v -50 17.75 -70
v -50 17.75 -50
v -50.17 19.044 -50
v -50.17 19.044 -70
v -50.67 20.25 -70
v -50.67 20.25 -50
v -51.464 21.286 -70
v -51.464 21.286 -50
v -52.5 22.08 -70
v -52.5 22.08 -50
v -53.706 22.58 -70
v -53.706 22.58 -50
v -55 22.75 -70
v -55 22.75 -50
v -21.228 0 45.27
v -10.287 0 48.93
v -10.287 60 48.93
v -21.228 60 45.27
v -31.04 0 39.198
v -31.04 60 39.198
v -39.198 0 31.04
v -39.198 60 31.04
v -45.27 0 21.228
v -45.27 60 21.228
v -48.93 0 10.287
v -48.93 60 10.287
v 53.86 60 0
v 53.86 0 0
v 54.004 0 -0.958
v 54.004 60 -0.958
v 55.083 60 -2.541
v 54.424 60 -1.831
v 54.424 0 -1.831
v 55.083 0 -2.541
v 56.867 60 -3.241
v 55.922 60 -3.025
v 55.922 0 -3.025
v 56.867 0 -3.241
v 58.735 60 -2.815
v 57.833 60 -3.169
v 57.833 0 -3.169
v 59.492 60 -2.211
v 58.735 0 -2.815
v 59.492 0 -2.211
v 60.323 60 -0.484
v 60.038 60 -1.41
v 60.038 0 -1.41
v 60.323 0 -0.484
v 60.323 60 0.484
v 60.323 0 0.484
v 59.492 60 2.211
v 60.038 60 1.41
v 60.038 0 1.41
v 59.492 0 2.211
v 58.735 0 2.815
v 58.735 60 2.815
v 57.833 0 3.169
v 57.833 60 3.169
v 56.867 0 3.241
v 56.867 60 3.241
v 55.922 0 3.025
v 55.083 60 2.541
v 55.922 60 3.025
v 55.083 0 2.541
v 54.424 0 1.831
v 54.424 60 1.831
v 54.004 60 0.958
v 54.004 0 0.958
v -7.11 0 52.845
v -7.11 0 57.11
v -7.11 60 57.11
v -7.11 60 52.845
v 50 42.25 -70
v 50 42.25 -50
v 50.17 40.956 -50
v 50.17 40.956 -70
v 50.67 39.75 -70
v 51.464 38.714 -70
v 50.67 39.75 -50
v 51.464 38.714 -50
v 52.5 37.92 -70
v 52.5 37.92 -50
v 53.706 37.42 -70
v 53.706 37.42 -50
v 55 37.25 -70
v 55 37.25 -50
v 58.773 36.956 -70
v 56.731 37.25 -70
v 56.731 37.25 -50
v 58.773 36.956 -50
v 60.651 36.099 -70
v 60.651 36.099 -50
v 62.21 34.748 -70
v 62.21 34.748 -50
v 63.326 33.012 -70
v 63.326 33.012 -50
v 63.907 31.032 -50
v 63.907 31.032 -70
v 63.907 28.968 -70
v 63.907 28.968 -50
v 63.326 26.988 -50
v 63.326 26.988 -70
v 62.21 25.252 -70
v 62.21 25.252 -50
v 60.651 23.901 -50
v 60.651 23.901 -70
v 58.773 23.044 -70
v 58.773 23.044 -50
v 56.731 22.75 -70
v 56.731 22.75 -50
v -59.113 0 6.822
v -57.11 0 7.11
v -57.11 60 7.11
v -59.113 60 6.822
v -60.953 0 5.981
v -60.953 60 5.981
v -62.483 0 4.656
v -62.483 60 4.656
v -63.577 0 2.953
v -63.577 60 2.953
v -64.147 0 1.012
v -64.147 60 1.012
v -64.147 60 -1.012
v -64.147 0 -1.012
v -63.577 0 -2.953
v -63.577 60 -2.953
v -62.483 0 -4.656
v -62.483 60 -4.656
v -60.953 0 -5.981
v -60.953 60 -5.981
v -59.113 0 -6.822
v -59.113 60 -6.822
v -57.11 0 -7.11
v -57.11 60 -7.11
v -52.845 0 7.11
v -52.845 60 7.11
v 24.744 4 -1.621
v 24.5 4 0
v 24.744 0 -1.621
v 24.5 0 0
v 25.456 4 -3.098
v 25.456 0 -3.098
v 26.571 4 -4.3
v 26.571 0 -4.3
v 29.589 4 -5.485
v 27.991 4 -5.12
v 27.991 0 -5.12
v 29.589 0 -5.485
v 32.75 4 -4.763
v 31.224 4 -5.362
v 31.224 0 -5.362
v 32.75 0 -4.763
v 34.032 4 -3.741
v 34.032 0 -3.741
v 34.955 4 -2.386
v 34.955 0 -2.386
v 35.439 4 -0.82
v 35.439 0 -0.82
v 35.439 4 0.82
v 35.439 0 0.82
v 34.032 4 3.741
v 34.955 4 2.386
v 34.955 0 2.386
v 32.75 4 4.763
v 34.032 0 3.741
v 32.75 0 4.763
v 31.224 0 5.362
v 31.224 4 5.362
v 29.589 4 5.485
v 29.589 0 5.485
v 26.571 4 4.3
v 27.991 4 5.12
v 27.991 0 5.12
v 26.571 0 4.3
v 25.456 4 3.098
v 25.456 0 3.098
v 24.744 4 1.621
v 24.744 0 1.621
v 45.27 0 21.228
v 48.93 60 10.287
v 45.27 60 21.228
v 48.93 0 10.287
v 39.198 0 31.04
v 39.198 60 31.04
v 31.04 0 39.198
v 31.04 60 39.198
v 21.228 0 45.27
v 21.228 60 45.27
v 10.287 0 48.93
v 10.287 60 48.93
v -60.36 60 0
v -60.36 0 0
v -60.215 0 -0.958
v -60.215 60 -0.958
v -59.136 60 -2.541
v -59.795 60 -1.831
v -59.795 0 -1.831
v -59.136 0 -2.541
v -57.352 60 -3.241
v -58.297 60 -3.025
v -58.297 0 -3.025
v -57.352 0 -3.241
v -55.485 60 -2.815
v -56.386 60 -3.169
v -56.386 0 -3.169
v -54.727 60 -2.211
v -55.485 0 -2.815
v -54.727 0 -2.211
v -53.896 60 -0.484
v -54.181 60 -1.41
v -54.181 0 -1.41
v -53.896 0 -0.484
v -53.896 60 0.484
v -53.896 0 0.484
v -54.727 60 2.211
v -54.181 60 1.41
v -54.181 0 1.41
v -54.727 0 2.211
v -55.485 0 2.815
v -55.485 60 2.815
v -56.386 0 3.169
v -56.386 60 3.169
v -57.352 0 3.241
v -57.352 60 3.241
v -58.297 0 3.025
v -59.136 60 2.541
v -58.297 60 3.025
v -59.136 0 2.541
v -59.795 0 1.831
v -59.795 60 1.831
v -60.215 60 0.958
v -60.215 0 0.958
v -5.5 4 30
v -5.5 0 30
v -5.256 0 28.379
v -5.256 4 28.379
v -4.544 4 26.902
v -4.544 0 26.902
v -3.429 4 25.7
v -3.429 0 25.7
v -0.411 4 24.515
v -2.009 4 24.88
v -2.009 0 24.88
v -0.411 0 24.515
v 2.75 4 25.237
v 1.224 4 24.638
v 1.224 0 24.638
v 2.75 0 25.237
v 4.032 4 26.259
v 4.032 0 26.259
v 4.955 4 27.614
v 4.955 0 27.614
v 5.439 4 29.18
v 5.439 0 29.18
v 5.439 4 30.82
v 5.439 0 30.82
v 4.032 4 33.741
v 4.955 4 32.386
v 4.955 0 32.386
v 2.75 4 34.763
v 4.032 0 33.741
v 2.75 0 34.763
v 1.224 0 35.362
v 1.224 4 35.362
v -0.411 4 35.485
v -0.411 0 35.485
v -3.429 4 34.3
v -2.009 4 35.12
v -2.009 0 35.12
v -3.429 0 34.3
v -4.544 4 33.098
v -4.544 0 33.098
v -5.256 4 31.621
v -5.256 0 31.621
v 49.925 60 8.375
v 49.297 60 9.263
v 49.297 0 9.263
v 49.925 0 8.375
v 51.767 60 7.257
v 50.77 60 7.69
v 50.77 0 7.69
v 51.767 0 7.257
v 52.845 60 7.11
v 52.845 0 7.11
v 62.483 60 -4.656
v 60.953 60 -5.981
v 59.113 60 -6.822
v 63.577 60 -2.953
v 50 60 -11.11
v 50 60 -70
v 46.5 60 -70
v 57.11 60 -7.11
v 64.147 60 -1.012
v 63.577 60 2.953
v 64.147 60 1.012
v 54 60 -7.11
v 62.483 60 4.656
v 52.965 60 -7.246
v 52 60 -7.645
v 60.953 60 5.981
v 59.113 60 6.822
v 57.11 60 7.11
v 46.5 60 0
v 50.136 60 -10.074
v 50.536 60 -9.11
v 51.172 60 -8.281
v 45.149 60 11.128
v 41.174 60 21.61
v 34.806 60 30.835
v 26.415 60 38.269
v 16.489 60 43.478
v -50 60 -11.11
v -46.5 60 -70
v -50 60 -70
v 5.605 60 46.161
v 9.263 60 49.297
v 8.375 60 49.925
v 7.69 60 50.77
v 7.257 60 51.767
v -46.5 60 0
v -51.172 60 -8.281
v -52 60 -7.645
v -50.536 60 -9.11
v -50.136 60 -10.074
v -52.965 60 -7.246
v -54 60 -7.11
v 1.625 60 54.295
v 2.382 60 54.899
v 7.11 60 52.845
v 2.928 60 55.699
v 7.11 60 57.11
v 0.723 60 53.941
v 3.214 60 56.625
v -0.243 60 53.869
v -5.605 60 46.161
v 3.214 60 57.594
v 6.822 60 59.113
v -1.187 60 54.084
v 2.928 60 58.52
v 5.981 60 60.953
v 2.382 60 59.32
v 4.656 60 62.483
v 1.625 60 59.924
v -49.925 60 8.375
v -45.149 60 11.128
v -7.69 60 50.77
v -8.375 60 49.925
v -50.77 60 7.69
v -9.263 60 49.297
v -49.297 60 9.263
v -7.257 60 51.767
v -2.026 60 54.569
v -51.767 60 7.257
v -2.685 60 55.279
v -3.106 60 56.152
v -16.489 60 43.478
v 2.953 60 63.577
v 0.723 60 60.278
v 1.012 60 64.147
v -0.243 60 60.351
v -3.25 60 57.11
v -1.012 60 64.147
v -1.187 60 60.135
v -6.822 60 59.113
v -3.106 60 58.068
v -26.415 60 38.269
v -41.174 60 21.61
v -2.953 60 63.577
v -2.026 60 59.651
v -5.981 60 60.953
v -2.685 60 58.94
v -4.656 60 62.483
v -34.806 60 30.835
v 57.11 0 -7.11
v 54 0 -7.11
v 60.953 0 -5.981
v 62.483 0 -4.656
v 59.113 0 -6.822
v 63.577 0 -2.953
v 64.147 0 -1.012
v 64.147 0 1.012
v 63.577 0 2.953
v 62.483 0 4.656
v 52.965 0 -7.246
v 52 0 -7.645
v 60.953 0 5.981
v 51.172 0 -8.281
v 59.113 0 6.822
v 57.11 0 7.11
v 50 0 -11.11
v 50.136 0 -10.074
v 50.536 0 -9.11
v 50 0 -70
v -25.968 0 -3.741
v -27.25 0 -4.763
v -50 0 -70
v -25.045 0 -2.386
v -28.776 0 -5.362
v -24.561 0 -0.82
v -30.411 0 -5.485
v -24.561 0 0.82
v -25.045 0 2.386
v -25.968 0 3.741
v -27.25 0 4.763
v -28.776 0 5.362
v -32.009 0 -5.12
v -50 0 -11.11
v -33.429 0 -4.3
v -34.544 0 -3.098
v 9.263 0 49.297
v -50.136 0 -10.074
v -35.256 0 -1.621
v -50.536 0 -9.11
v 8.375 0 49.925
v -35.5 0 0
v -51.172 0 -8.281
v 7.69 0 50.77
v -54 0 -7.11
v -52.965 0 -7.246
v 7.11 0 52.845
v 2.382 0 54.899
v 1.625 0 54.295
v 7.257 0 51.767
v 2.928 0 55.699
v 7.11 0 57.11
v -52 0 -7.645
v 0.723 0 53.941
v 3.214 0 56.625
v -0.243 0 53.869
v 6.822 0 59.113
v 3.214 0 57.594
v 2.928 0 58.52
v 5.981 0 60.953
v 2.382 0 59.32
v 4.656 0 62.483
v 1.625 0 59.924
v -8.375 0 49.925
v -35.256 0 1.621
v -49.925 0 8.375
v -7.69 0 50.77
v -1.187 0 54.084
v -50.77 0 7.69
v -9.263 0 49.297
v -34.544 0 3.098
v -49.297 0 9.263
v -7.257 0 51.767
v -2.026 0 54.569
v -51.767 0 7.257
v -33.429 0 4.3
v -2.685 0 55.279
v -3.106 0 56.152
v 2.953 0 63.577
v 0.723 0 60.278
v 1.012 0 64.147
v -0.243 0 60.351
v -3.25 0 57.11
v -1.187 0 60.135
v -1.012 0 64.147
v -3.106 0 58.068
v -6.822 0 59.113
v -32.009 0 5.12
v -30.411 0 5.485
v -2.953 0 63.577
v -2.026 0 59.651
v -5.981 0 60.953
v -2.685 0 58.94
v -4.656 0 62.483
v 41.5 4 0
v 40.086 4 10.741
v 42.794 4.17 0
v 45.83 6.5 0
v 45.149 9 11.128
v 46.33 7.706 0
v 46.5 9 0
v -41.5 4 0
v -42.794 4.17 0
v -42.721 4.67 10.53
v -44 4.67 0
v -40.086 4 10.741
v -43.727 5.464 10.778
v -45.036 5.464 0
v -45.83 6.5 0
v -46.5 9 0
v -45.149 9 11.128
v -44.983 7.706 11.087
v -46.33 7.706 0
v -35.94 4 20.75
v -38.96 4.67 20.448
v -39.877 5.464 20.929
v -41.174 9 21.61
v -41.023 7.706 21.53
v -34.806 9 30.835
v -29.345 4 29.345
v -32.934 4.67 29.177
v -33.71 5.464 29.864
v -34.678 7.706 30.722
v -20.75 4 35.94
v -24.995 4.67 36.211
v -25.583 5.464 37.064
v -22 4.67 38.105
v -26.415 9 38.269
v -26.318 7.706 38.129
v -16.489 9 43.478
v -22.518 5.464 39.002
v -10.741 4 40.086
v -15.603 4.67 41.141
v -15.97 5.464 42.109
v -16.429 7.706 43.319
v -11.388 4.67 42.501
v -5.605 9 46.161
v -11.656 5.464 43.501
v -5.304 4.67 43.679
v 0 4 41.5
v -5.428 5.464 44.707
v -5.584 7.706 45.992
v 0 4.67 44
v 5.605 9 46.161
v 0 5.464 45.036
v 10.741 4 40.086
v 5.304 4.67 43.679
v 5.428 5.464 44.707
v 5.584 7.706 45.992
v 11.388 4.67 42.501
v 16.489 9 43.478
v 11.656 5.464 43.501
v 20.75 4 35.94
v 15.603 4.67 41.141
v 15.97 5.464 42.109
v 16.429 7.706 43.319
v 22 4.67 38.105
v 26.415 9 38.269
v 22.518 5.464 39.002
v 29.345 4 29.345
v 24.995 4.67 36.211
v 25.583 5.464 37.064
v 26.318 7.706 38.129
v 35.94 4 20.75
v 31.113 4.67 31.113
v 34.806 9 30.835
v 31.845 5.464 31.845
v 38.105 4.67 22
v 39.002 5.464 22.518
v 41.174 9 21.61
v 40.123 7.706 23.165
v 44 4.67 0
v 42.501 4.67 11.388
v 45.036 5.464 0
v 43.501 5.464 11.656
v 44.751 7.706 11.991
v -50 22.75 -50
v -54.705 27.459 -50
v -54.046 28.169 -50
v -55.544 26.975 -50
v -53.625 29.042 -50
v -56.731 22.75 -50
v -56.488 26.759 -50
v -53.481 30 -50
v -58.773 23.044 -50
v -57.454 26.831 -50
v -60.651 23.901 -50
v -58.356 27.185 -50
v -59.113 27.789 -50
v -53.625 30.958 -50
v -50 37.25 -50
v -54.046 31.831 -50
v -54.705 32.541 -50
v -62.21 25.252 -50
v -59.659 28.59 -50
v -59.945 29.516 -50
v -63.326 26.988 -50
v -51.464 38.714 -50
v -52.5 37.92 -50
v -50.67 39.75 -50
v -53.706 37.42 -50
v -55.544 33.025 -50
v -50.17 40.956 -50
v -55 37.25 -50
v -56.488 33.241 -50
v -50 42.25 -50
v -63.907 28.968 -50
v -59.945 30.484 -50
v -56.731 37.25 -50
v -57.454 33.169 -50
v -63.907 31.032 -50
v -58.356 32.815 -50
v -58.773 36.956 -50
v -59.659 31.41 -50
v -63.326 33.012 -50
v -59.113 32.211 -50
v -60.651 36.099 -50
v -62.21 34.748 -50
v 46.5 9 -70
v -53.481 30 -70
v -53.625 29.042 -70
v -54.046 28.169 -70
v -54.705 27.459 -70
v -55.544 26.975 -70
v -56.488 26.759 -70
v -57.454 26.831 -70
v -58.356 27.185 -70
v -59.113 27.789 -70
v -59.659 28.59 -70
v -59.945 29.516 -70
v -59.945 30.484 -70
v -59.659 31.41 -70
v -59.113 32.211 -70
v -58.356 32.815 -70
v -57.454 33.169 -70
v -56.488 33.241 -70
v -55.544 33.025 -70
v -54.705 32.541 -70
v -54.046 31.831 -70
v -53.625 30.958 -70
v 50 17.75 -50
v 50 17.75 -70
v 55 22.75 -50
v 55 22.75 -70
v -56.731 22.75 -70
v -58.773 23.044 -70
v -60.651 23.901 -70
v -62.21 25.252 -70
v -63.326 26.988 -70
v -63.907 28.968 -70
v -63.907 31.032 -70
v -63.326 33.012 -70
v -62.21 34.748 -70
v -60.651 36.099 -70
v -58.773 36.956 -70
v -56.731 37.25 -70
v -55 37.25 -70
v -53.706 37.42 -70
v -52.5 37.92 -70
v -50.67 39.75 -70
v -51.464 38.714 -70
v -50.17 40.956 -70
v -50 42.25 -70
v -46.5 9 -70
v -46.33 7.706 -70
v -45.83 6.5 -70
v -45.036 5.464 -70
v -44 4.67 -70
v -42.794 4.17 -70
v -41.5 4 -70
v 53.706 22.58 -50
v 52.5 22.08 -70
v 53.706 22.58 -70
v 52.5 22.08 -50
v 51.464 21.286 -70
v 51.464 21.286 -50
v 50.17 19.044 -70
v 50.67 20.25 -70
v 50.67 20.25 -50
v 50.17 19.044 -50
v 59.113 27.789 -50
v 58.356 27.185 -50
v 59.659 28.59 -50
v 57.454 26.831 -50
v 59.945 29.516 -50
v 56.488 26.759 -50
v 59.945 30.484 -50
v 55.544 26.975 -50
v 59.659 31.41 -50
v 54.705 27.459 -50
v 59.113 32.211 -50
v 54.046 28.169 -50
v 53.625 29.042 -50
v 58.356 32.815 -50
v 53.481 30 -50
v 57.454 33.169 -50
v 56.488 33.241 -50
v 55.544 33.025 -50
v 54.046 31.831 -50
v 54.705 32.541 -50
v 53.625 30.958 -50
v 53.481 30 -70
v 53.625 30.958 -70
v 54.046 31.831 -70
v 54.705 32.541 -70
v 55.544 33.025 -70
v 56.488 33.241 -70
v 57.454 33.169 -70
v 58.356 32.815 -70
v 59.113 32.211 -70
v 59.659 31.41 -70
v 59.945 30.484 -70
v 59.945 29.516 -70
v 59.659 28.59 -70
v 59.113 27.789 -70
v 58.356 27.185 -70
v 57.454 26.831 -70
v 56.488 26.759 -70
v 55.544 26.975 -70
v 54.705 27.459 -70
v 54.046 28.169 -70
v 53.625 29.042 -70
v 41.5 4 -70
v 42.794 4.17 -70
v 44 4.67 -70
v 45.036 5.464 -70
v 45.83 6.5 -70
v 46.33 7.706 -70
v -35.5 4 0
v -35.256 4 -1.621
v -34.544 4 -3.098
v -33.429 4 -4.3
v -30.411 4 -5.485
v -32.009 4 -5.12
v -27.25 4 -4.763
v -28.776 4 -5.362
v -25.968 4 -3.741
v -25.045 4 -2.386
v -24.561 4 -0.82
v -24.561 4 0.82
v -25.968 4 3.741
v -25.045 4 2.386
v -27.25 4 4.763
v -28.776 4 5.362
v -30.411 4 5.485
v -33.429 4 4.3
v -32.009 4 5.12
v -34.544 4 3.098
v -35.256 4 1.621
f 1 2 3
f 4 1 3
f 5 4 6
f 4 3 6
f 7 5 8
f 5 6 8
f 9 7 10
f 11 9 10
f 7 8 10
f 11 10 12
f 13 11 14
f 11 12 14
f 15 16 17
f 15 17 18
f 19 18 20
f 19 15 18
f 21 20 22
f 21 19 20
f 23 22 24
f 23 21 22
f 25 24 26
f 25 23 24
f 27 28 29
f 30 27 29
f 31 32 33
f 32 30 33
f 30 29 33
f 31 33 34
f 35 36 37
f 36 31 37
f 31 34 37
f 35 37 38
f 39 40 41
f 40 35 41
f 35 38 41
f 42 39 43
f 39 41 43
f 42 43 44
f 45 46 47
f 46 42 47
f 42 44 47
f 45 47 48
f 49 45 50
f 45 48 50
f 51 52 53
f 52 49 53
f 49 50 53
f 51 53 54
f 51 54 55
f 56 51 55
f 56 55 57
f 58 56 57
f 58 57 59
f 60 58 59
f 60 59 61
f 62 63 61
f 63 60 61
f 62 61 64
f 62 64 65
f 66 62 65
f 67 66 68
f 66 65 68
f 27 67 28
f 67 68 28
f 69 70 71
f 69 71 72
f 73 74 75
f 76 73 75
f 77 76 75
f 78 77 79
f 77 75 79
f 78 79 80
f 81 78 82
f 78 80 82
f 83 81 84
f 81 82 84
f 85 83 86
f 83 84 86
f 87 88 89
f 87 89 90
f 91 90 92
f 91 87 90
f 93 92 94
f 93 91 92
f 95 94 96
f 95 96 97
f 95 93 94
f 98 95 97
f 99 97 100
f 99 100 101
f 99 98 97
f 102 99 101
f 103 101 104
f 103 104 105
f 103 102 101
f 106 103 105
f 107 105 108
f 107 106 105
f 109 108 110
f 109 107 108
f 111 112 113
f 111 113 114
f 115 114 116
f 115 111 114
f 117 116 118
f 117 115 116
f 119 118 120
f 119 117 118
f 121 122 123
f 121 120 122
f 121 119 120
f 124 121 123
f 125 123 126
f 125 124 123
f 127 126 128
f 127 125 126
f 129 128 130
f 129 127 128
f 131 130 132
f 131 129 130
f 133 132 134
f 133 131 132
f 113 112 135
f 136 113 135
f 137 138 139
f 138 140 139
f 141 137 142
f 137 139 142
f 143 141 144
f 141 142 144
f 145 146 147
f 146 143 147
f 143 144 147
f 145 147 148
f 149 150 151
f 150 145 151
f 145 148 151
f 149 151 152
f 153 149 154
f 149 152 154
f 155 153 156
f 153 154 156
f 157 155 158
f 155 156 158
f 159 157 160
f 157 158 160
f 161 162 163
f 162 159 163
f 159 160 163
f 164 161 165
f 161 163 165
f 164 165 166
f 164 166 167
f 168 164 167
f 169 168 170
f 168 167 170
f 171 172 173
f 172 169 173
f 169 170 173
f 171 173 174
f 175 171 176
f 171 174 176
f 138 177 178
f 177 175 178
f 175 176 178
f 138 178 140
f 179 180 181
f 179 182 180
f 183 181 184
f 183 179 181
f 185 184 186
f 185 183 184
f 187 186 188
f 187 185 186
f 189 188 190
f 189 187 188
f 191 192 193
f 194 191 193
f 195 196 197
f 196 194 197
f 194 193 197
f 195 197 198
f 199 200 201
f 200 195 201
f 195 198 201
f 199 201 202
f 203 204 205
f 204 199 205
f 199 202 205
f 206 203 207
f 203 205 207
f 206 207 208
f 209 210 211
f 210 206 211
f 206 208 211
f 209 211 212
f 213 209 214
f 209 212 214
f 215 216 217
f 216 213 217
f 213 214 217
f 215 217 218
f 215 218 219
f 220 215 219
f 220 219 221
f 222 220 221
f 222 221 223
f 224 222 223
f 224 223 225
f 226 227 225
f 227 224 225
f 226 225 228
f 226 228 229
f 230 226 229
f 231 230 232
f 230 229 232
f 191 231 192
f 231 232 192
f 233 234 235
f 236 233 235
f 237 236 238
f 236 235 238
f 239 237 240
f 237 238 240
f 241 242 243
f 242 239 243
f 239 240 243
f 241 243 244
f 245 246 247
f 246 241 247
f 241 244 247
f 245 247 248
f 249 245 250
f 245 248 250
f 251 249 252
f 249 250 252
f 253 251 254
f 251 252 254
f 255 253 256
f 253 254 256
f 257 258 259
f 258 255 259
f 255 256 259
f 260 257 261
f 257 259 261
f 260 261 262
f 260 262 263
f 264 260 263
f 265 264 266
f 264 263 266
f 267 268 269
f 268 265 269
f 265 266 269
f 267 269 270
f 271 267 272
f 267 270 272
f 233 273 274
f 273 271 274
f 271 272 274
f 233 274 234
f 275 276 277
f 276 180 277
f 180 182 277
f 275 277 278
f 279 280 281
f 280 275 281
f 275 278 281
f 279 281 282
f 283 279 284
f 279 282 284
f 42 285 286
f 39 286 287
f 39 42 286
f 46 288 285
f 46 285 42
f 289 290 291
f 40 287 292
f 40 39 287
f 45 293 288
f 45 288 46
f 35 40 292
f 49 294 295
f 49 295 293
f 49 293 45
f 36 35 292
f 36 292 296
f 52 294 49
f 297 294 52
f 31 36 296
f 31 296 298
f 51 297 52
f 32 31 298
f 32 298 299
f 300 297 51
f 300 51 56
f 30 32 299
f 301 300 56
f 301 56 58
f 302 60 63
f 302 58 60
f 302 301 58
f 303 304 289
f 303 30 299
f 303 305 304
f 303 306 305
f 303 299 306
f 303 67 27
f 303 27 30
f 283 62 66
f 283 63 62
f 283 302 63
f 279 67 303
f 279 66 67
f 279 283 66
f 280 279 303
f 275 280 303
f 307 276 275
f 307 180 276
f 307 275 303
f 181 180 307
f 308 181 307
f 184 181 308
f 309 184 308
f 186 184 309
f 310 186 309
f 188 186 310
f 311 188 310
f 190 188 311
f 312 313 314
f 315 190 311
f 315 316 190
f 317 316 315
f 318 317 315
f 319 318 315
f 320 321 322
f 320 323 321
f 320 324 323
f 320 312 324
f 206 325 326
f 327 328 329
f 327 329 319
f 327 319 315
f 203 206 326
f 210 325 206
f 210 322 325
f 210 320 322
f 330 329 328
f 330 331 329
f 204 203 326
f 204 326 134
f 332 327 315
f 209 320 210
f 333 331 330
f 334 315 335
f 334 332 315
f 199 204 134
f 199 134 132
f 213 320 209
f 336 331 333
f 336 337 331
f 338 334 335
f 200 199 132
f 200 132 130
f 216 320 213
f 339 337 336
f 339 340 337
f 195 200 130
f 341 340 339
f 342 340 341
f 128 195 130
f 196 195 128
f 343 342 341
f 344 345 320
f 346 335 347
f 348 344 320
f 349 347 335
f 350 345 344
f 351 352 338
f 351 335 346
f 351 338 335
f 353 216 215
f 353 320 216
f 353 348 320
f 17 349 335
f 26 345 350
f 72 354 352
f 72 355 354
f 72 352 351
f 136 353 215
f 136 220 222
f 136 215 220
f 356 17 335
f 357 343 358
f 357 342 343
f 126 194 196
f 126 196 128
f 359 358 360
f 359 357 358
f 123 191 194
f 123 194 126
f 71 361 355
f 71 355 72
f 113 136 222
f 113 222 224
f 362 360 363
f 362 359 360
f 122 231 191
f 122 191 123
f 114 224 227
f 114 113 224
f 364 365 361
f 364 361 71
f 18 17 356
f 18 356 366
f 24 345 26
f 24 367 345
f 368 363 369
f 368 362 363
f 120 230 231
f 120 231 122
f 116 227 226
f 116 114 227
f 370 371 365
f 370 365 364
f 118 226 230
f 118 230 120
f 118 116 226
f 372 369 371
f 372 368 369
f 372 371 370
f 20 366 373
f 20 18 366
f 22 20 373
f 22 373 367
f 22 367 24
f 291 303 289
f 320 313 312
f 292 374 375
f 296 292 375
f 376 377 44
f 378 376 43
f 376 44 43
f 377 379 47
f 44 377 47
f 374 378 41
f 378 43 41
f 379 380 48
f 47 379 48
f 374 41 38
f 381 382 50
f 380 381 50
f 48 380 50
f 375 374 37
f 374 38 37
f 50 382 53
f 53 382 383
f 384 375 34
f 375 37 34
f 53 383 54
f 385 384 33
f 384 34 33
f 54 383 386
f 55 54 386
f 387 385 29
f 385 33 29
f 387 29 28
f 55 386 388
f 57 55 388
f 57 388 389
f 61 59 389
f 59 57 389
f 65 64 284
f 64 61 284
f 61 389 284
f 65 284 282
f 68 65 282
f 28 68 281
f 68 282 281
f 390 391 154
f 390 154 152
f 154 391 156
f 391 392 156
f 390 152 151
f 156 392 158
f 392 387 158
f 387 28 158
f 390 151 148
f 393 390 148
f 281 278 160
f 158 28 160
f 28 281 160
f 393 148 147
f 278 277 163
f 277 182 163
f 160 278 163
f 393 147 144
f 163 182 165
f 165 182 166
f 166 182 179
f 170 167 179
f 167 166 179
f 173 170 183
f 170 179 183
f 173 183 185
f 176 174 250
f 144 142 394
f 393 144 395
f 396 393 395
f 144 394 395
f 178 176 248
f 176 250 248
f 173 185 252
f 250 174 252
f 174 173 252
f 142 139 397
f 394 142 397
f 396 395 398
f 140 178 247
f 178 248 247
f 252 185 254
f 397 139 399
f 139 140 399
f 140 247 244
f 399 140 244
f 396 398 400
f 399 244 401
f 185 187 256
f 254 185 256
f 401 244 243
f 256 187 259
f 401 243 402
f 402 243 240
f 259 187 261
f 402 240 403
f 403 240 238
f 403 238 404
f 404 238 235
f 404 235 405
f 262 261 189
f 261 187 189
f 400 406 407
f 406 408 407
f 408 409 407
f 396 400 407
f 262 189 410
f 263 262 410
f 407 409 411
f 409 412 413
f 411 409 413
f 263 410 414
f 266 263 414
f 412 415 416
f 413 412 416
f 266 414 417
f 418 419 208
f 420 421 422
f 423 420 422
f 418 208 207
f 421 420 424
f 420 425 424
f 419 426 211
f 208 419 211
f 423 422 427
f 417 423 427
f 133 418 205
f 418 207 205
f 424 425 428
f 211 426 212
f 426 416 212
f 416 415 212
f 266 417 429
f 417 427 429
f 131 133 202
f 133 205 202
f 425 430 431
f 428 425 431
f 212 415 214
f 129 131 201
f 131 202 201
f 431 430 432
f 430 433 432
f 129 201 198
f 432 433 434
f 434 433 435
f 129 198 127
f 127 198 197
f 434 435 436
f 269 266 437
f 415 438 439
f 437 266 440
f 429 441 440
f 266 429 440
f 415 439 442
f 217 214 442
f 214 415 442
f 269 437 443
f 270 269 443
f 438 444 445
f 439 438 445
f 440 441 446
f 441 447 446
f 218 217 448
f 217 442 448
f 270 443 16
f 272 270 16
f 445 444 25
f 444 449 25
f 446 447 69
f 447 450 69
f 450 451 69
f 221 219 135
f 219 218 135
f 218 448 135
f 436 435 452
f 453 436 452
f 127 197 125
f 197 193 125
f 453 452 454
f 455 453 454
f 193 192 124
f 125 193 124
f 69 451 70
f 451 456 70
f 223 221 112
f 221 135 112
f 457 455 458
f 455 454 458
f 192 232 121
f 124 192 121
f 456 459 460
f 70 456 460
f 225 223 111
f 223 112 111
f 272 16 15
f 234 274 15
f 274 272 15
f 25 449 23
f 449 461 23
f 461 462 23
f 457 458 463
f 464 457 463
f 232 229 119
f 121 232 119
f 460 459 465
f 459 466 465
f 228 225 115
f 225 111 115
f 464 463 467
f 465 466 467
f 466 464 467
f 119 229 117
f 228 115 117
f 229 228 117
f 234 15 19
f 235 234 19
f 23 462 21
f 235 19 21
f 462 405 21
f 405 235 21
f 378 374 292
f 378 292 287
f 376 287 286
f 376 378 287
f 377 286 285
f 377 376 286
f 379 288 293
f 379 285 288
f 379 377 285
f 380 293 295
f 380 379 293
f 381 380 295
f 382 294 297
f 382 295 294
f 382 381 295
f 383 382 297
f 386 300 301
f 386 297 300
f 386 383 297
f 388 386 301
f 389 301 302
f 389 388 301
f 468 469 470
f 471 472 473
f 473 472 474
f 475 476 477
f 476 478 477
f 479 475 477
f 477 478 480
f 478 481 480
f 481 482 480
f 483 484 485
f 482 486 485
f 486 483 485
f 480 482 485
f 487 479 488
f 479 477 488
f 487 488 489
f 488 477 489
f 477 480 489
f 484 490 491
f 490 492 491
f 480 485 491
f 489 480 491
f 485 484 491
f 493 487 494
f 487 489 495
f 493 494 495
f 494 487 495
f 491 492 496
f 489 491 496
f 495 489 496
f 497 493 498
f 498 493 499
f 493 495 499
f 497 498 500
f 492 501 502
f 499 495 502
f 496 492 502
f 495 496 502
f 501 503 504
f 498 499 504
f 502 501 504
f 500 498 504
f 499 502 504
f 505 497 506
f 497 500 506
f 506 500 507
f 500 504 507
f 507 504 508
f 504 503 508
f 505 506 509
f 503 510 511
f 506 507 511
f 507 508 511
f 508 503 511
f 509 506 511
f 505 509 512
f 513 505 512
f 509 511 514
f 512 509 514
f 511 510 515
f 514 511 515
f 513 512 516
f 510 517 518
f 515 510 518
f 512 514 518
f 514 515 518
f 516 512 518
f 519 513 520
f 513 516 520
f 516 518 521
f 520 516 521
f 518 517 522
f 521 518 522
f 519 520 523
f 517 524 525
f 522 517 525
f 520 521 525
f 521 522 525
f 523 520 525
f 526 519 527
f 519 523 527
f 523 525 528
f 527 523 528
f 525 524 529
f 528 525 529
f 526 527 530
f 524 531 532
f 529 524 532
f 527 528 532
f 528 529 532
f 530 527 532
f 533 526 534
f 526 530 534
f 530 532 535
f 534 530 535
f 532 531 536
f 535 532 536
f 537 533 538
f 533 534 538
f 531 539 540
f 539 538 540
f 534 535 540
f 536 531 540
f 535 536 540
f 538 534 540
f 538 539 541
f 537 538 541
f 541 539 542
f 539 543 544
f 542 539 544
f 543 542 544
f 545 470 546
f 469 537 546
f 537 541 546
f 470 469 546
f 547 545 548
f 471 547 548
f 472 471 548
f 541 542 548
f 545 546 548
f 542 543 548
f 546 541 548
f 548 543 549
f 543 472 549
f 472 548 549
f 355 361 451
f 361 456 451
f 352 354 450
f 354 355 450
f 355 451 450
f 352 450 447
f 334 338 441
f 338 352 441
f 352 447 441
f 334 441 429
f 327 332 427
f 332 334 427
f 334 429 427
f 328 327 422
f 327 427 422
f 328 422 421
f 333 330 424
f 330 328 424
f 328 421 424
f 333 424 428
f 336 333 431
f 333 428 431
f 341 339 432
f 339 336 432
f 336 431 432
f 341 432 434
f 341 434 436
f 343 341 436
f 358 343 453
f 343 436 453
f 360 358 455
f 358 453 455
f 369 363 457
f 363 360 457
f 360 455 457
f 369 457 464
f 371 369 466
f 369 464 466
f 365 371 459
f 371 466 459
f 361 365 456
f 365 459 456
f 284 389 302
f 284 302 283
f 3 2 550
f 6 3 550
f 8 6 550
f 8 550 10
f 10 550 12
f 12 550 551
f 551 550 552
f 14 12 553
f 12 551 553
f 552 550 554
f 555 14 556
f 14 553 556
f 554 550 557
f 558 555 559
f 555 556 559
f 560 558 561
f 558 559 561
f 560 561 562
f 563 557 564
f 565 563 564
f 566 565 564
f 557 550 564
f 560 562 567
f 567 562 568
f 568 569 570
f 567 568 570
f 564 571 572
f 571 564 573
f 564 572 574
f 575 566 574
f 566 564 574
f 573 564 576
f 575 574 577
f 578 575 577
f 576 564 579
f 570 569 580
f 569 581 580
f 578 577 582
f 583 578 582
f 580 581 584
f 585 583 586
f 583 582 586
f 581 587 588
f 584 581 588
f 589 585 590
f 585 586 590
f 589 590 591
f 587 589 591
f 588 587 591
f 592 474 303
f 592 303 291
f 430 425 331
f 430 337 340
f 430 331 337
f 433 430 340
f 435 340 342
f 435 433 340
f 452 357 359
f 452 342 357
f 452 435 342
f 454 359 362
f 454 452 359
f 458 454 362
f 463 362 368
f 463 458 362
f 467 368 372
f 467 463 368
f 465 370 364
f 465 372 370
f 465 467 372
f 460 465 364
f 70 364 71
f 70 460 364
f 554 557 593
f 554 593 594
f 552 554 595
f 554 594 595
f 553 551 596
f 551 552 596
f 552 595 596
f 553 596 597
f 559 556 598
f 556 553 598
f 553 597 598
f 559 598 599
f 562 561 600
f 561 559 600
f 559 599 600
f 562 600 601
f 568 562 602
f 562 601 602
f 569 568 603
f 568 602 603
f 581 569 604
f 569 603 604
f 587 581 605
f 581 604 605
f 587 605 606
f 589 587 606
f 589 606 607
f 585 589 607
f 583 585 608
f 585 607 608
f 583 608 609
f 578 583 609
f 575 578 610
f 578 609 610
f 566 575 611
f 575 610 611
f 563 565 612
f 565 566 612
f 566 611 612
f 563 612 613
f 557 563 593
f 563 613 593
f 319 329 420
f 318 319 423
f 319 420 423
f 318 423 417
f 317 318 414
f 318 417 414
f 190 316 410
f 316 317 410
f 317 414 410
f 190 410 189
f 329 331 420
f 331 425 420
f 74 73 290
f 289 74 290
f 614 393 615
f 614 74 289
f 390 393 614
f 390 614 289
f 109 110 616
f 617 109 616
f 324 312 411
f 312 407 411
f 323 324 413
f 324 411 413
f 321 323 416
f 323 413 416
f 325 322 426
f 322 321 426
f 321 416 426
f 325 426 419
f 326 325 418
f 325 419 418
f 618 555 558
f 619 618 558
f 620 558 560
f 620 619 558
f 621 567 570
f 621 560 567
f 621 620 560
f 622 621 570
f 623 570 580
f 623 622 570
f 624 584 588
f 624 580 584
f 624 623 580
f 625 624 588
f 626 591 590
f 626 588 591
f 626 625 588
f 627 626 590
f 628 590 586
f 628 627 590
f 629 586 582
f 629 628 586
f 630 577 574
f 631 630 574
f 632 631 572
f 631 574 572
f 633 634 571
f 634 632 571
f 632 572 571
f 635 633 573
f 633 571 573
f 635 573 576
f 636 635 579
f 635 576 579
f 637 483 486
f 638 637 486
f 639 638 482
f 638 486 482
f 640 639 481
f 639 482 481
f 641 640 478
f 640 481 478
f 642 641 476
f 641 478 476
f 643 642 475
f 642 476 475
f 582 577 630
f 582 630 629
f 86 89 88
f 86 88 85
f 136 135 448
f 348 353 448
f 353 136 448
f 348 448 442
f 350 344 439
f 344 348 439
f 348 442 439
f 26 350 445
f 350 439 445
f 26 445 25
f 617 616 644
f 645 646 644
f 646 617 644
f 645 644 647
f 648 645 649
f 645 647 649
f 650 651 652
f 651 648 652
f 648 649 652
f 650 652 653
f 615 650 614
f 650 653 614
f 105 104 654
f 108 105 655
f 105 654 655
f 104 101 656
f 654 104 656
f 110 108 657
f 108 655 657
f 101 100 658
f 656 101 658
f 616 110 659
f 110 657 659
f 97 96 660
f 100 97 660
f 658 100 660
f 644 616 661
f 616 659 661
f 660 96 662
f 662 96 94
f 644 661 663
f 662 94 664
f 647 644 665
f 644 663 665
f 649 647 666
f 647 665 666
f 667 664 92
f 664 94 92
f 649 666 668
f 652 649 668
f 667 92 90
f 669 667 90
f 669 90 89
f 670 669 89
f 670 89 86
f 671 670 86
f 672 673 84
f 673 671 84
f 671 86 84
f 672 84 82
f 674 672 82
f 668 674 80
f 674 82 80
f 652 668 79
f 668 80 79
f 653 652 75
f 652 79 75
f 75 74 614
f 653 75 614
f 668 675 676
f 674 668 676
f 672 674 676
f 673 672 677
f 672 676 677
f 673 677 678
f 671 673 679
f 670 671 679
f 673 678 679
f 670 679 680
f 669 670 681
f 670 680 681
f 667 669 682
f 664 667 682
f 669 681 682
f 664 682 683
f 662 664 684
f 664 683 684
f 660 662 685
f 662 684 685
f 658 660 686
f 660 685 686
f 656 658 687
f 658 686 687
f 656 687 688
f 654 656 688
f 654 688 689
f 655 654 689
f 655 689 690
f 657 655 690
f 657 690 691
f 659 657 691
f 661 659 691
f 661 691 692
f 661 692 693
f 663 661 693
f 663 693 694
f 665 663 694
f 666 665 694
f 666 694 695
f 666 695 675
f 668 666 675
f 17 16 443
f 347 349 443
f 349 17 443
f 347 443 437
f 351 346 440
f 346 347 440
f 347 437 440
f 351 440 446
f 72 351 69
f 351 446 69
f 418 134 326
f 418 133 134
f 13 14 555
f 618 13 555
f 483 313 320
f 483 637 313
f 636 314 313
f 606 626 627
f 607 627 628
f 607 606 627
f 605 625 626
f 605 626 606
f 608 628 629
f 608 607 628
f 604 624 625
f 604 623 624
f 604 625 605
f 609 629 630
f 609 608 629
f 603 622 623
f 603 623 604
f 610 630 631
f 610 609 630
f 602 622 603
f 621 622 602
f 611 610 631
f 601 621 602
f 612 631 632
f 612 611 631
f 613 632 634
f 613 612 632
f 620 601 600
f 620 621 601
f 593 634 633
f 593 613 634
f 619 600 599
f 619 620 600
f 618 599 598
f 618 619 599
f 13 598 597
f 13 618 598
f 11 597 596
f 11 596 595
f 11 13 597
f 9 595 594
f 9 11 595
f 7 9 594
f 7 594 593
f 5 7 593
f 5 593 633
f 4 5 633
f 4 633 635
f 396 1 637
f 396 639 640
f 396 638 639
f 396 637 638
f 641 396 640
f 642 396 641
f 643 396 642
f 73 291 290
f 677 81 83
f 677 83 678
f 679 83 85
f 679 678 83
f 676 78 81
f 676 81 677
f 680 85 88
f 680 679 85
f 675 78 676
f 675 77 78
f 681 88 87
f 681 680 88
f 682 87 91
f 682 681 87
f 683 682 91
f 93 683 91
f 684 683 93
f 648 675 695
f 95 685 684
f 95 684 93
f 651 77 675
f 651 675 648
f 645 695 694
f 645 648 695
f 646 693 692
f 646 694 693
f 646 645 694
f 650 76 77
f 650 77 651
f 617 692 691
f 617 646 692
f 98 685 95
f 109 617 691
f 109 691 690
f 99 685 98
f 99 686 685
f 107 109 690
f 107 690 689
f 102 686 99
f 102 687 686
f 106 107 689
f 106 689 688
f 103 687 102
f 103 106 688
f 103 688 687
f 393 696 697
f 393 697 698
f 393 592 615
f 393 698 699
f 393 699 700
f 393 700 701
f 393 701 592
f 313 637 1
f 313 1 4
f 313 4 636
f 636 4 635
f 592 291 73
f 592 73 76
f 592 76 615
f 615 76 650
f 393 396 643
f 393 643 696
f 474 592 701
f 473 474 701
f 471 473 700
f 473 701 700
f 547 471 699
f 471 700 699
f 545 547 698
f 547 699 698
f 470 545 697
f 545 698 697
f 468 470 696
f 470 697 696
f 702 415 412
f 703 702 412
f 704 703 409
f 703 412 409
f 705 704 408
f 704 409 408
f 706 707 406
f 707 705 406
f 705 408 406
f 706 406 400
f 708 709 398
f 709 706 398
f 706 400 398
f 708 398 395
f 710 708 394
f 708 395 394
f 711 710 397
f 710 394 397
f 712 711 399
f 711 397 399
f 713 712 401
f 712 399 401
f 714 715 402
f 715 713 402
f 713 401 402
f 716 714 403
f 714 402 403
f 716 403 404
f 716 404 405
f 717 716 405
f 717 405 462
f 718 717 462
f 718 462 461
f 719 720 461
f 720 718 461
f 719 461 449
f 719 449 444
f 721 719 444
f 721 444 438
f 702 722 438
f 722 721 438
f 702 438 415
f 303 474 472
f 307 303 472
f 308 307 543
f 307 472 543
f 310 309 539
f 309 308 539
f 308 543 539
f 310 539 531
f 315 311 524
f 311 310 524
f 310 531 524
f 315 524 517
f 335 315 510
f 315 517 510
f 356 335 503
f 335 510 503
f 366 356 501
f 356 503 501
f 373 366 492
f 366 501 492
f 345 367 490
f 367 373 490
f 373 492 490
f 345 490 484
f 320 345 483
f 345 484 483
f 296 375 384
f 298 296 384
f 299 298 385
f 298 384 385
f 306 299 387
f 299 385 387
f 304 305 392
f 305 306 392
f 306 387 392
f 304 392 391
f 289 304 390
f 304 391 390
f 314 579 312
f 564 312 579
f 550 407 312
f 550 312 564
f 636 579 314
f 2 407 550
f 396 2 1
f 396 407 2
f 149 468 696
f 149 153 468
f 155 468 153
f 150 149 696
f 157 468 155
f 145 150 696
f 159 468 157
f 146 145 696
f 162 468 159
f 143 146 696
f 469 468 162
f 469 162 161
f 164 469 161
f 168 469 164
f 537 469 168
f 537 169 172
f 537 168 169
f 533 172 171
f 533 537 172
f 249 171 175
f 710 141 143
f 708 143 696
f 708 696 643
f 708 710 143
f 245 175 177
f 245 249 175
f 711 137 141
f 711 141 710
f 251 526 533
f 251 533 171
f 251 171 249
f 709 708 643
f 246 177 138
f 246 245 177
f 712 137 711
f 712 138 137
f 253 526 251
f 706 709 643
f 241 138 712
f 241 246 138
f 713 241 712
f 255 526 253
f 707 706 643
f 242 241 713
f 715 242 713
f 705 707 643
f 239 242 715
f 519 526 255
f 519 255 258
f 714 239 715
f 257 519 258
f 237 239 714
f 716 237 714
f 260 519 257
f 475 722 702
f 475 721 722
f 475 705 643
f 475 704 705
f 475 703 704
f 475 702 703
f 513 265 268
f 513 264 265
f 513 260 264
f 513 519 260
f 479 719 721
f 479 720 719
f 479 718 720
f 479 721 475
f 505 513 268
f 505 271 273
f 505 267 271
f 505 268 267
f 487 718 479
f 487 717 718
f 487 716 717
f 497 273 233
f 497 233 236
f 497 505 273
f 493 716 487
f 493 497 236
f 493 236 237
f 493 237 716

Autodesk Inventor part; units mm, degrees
ref_plane "YZ Plane" through (0, 0, 0) normal (1, 0, 0) x (0, 1, 0)
ref_plane "XZ Plane" through (0, 0, 0) normal (0, 1, 0) x (-1, 0, 0)
ref_plane "XY Plane" through (0, 0, 0) normal (0, 0, 1) x (1, 0, 0)
sketch "Sketch1" plane through (0, 0, 0) normal (0, 1, 0) x (-1, 0, 0)
  arc A0 (-10.2866, 48.9304) -> (-48.9304, 10.2866) centre (0, 0) ccw
  circle A1 centre (30, 0) radius 5.5
  circle A2 centre (0, 30) radius 5.5
  circle A3 centre (-30, 0) radius 5.5
  line L0 (50, -11.1096) -> (50, -70)
  line L1 (50, -70) -> (-50, -70)
  line L2 (-50, -70) -> (-50, -11.1096)
  line L3 (-46.5, 0) -> (-46.5, -70)
  line L4 (46.5, -70) -> (46.5, 0)
  arc A4 (46.5, 0) -> (-46.5, 0) centre (0, 0) ccw
  circle A5 centre (57.1096, 0) radius 3.25
  circle A6 centre (57.1096, 0) radius 7.1096
  line L5 (57.1096, -7.1096) -> (54, -7.1096)
  line L6 (57.1096, 7.1096) -> (52.8448, 7.1096)
  circle A7 centre (0, 57.1096) radius 7.1096
  circle A8 centre (0, 57.1096) radius 3.25
  circle A9 centre (-57.1096, 0) radius 7.1096
  circle A10 centre (-57.1096, 0) radius 3.25
  line L7 (-57.1096, -7.1096) -> (-54, -7.1096)
  line L8 (-57.1096, 7.1096) -> (-52.8448, 7.1096)
  line L9 (-7.1096, 57.1096) -> (-7.1096, 52.8448)
  line L10 (7.1096, 57.1096) -> (7.1096, 52.8448)
  arc A11 (48.9304, 10.2866) -> (52.8448, 7.1096) centre (52.8448, 11.1096) ccw
  arc A12 (-52.8448, 7.1096) -> (-48.9304, 10.2866) centre (-52.8448, 11.1096) ccw
  arc A13 (-10.2866, 48.9304) -> (-7.1096, 52.8448) centre (-11.1096, 52.8448) ccw
  arc A14 (54, -7.1096) -> (50, -11.1096) centre (54, -11.1096) ccw
  arc A15 (-50, -11.1096) -> (-54, -7.1096) centre (-54, -11.1096) ccw
  arc A16 (48.9304, 10.2866) -> (10.2866, 48.9304) centre (0, 0) ccw
  arc A17 (7.1096, 52.8448) -> (10.2866, 48.9304) centre (11.1096, 52.8448) ccw
  point P0 (50, 0)
  point P1 (-50, 0)
  point P2 (49.492, 7.1096)
  point P3 (-49.492, 7.1096)
  point P4 (-7.1096, 49.492)
  point P5 (7.1096, 49.492)
  dimension "d0" = 100
  dimension "d1" = 11
  dimension "d2" = 30
  dimension "d5" = 180
  dimension "d7" = 3.5
  dimension "d8" = 70
  dimension "d9" = 6.5
  dimension "d12" = 180
  dimension "d14" = 4
  dimension "d15" = 4
extrude "Extrusion1" add sketch "Sketch1" along normal blind 4 contours L3 A4 L4 L1
extrude "Extrusion2" add sketch "Sketch1" along normal blind 60 contours A13 L9 A7 L10 A17 A16 A11 L6 A6 L5 A14 L0 L1 L4 A4 L3 L2 A15 L7 A9 L8 A12 A0 | A7 | A9 | A6
ref_plane "Work Plane1" through (0, 0, -11.1096) normal (1, 0, 0) x (0, 0, -1)
sketch "Sketch2" plane through (50, 0, -70) normal (0, 0, -1) x (-1, 0, 0)
  circle A0 centre (-6.7309, 30) radius 3.25
  arc A1 (-6.7309, 37.25) -> (-6.7309, 22.75) centre (-6.7309, 30) ccw
  line L0 (-6.7309, 37.25) -> (0, 37.25)
  line L1 (0, 0) -> (0, 60) projected
  line L2 (-6.7309, 22.75) -> (0, 22.75)
  line L3 (0, 37.25) -> (0, 22.75)
  line L4 (0, 60) -> (3.5, 60) projected
  point P0 (50, 0)
  dimension "d20" = 6.5
  dimension "d21" = 4
  dimension "d22" = 30
  dimension "d23" = 60
extrude "Extrusion3" add sketch "Sketch2" against normal blind 20
fillet "Fillet1" radius 5 2 edges at (50, 37.25, -60) (50, 22.75, -60)
mirror "Mirror1" about plane through (0, 0, -11.1096) normal (1, 0, 0) of "Extrusion3"
fillet "Fillet2" radius 5 2 edges at (-50, 37.25, -60) (-50, 22.75, -60)
fillet "Fillet3" radius 5 3 edges at (0, 4, 46.5) (46.5, 4, -35) (-46.5, 4, -35)
equation "\"d22\" = 0.5 * d23"
properties part number "Fej"
